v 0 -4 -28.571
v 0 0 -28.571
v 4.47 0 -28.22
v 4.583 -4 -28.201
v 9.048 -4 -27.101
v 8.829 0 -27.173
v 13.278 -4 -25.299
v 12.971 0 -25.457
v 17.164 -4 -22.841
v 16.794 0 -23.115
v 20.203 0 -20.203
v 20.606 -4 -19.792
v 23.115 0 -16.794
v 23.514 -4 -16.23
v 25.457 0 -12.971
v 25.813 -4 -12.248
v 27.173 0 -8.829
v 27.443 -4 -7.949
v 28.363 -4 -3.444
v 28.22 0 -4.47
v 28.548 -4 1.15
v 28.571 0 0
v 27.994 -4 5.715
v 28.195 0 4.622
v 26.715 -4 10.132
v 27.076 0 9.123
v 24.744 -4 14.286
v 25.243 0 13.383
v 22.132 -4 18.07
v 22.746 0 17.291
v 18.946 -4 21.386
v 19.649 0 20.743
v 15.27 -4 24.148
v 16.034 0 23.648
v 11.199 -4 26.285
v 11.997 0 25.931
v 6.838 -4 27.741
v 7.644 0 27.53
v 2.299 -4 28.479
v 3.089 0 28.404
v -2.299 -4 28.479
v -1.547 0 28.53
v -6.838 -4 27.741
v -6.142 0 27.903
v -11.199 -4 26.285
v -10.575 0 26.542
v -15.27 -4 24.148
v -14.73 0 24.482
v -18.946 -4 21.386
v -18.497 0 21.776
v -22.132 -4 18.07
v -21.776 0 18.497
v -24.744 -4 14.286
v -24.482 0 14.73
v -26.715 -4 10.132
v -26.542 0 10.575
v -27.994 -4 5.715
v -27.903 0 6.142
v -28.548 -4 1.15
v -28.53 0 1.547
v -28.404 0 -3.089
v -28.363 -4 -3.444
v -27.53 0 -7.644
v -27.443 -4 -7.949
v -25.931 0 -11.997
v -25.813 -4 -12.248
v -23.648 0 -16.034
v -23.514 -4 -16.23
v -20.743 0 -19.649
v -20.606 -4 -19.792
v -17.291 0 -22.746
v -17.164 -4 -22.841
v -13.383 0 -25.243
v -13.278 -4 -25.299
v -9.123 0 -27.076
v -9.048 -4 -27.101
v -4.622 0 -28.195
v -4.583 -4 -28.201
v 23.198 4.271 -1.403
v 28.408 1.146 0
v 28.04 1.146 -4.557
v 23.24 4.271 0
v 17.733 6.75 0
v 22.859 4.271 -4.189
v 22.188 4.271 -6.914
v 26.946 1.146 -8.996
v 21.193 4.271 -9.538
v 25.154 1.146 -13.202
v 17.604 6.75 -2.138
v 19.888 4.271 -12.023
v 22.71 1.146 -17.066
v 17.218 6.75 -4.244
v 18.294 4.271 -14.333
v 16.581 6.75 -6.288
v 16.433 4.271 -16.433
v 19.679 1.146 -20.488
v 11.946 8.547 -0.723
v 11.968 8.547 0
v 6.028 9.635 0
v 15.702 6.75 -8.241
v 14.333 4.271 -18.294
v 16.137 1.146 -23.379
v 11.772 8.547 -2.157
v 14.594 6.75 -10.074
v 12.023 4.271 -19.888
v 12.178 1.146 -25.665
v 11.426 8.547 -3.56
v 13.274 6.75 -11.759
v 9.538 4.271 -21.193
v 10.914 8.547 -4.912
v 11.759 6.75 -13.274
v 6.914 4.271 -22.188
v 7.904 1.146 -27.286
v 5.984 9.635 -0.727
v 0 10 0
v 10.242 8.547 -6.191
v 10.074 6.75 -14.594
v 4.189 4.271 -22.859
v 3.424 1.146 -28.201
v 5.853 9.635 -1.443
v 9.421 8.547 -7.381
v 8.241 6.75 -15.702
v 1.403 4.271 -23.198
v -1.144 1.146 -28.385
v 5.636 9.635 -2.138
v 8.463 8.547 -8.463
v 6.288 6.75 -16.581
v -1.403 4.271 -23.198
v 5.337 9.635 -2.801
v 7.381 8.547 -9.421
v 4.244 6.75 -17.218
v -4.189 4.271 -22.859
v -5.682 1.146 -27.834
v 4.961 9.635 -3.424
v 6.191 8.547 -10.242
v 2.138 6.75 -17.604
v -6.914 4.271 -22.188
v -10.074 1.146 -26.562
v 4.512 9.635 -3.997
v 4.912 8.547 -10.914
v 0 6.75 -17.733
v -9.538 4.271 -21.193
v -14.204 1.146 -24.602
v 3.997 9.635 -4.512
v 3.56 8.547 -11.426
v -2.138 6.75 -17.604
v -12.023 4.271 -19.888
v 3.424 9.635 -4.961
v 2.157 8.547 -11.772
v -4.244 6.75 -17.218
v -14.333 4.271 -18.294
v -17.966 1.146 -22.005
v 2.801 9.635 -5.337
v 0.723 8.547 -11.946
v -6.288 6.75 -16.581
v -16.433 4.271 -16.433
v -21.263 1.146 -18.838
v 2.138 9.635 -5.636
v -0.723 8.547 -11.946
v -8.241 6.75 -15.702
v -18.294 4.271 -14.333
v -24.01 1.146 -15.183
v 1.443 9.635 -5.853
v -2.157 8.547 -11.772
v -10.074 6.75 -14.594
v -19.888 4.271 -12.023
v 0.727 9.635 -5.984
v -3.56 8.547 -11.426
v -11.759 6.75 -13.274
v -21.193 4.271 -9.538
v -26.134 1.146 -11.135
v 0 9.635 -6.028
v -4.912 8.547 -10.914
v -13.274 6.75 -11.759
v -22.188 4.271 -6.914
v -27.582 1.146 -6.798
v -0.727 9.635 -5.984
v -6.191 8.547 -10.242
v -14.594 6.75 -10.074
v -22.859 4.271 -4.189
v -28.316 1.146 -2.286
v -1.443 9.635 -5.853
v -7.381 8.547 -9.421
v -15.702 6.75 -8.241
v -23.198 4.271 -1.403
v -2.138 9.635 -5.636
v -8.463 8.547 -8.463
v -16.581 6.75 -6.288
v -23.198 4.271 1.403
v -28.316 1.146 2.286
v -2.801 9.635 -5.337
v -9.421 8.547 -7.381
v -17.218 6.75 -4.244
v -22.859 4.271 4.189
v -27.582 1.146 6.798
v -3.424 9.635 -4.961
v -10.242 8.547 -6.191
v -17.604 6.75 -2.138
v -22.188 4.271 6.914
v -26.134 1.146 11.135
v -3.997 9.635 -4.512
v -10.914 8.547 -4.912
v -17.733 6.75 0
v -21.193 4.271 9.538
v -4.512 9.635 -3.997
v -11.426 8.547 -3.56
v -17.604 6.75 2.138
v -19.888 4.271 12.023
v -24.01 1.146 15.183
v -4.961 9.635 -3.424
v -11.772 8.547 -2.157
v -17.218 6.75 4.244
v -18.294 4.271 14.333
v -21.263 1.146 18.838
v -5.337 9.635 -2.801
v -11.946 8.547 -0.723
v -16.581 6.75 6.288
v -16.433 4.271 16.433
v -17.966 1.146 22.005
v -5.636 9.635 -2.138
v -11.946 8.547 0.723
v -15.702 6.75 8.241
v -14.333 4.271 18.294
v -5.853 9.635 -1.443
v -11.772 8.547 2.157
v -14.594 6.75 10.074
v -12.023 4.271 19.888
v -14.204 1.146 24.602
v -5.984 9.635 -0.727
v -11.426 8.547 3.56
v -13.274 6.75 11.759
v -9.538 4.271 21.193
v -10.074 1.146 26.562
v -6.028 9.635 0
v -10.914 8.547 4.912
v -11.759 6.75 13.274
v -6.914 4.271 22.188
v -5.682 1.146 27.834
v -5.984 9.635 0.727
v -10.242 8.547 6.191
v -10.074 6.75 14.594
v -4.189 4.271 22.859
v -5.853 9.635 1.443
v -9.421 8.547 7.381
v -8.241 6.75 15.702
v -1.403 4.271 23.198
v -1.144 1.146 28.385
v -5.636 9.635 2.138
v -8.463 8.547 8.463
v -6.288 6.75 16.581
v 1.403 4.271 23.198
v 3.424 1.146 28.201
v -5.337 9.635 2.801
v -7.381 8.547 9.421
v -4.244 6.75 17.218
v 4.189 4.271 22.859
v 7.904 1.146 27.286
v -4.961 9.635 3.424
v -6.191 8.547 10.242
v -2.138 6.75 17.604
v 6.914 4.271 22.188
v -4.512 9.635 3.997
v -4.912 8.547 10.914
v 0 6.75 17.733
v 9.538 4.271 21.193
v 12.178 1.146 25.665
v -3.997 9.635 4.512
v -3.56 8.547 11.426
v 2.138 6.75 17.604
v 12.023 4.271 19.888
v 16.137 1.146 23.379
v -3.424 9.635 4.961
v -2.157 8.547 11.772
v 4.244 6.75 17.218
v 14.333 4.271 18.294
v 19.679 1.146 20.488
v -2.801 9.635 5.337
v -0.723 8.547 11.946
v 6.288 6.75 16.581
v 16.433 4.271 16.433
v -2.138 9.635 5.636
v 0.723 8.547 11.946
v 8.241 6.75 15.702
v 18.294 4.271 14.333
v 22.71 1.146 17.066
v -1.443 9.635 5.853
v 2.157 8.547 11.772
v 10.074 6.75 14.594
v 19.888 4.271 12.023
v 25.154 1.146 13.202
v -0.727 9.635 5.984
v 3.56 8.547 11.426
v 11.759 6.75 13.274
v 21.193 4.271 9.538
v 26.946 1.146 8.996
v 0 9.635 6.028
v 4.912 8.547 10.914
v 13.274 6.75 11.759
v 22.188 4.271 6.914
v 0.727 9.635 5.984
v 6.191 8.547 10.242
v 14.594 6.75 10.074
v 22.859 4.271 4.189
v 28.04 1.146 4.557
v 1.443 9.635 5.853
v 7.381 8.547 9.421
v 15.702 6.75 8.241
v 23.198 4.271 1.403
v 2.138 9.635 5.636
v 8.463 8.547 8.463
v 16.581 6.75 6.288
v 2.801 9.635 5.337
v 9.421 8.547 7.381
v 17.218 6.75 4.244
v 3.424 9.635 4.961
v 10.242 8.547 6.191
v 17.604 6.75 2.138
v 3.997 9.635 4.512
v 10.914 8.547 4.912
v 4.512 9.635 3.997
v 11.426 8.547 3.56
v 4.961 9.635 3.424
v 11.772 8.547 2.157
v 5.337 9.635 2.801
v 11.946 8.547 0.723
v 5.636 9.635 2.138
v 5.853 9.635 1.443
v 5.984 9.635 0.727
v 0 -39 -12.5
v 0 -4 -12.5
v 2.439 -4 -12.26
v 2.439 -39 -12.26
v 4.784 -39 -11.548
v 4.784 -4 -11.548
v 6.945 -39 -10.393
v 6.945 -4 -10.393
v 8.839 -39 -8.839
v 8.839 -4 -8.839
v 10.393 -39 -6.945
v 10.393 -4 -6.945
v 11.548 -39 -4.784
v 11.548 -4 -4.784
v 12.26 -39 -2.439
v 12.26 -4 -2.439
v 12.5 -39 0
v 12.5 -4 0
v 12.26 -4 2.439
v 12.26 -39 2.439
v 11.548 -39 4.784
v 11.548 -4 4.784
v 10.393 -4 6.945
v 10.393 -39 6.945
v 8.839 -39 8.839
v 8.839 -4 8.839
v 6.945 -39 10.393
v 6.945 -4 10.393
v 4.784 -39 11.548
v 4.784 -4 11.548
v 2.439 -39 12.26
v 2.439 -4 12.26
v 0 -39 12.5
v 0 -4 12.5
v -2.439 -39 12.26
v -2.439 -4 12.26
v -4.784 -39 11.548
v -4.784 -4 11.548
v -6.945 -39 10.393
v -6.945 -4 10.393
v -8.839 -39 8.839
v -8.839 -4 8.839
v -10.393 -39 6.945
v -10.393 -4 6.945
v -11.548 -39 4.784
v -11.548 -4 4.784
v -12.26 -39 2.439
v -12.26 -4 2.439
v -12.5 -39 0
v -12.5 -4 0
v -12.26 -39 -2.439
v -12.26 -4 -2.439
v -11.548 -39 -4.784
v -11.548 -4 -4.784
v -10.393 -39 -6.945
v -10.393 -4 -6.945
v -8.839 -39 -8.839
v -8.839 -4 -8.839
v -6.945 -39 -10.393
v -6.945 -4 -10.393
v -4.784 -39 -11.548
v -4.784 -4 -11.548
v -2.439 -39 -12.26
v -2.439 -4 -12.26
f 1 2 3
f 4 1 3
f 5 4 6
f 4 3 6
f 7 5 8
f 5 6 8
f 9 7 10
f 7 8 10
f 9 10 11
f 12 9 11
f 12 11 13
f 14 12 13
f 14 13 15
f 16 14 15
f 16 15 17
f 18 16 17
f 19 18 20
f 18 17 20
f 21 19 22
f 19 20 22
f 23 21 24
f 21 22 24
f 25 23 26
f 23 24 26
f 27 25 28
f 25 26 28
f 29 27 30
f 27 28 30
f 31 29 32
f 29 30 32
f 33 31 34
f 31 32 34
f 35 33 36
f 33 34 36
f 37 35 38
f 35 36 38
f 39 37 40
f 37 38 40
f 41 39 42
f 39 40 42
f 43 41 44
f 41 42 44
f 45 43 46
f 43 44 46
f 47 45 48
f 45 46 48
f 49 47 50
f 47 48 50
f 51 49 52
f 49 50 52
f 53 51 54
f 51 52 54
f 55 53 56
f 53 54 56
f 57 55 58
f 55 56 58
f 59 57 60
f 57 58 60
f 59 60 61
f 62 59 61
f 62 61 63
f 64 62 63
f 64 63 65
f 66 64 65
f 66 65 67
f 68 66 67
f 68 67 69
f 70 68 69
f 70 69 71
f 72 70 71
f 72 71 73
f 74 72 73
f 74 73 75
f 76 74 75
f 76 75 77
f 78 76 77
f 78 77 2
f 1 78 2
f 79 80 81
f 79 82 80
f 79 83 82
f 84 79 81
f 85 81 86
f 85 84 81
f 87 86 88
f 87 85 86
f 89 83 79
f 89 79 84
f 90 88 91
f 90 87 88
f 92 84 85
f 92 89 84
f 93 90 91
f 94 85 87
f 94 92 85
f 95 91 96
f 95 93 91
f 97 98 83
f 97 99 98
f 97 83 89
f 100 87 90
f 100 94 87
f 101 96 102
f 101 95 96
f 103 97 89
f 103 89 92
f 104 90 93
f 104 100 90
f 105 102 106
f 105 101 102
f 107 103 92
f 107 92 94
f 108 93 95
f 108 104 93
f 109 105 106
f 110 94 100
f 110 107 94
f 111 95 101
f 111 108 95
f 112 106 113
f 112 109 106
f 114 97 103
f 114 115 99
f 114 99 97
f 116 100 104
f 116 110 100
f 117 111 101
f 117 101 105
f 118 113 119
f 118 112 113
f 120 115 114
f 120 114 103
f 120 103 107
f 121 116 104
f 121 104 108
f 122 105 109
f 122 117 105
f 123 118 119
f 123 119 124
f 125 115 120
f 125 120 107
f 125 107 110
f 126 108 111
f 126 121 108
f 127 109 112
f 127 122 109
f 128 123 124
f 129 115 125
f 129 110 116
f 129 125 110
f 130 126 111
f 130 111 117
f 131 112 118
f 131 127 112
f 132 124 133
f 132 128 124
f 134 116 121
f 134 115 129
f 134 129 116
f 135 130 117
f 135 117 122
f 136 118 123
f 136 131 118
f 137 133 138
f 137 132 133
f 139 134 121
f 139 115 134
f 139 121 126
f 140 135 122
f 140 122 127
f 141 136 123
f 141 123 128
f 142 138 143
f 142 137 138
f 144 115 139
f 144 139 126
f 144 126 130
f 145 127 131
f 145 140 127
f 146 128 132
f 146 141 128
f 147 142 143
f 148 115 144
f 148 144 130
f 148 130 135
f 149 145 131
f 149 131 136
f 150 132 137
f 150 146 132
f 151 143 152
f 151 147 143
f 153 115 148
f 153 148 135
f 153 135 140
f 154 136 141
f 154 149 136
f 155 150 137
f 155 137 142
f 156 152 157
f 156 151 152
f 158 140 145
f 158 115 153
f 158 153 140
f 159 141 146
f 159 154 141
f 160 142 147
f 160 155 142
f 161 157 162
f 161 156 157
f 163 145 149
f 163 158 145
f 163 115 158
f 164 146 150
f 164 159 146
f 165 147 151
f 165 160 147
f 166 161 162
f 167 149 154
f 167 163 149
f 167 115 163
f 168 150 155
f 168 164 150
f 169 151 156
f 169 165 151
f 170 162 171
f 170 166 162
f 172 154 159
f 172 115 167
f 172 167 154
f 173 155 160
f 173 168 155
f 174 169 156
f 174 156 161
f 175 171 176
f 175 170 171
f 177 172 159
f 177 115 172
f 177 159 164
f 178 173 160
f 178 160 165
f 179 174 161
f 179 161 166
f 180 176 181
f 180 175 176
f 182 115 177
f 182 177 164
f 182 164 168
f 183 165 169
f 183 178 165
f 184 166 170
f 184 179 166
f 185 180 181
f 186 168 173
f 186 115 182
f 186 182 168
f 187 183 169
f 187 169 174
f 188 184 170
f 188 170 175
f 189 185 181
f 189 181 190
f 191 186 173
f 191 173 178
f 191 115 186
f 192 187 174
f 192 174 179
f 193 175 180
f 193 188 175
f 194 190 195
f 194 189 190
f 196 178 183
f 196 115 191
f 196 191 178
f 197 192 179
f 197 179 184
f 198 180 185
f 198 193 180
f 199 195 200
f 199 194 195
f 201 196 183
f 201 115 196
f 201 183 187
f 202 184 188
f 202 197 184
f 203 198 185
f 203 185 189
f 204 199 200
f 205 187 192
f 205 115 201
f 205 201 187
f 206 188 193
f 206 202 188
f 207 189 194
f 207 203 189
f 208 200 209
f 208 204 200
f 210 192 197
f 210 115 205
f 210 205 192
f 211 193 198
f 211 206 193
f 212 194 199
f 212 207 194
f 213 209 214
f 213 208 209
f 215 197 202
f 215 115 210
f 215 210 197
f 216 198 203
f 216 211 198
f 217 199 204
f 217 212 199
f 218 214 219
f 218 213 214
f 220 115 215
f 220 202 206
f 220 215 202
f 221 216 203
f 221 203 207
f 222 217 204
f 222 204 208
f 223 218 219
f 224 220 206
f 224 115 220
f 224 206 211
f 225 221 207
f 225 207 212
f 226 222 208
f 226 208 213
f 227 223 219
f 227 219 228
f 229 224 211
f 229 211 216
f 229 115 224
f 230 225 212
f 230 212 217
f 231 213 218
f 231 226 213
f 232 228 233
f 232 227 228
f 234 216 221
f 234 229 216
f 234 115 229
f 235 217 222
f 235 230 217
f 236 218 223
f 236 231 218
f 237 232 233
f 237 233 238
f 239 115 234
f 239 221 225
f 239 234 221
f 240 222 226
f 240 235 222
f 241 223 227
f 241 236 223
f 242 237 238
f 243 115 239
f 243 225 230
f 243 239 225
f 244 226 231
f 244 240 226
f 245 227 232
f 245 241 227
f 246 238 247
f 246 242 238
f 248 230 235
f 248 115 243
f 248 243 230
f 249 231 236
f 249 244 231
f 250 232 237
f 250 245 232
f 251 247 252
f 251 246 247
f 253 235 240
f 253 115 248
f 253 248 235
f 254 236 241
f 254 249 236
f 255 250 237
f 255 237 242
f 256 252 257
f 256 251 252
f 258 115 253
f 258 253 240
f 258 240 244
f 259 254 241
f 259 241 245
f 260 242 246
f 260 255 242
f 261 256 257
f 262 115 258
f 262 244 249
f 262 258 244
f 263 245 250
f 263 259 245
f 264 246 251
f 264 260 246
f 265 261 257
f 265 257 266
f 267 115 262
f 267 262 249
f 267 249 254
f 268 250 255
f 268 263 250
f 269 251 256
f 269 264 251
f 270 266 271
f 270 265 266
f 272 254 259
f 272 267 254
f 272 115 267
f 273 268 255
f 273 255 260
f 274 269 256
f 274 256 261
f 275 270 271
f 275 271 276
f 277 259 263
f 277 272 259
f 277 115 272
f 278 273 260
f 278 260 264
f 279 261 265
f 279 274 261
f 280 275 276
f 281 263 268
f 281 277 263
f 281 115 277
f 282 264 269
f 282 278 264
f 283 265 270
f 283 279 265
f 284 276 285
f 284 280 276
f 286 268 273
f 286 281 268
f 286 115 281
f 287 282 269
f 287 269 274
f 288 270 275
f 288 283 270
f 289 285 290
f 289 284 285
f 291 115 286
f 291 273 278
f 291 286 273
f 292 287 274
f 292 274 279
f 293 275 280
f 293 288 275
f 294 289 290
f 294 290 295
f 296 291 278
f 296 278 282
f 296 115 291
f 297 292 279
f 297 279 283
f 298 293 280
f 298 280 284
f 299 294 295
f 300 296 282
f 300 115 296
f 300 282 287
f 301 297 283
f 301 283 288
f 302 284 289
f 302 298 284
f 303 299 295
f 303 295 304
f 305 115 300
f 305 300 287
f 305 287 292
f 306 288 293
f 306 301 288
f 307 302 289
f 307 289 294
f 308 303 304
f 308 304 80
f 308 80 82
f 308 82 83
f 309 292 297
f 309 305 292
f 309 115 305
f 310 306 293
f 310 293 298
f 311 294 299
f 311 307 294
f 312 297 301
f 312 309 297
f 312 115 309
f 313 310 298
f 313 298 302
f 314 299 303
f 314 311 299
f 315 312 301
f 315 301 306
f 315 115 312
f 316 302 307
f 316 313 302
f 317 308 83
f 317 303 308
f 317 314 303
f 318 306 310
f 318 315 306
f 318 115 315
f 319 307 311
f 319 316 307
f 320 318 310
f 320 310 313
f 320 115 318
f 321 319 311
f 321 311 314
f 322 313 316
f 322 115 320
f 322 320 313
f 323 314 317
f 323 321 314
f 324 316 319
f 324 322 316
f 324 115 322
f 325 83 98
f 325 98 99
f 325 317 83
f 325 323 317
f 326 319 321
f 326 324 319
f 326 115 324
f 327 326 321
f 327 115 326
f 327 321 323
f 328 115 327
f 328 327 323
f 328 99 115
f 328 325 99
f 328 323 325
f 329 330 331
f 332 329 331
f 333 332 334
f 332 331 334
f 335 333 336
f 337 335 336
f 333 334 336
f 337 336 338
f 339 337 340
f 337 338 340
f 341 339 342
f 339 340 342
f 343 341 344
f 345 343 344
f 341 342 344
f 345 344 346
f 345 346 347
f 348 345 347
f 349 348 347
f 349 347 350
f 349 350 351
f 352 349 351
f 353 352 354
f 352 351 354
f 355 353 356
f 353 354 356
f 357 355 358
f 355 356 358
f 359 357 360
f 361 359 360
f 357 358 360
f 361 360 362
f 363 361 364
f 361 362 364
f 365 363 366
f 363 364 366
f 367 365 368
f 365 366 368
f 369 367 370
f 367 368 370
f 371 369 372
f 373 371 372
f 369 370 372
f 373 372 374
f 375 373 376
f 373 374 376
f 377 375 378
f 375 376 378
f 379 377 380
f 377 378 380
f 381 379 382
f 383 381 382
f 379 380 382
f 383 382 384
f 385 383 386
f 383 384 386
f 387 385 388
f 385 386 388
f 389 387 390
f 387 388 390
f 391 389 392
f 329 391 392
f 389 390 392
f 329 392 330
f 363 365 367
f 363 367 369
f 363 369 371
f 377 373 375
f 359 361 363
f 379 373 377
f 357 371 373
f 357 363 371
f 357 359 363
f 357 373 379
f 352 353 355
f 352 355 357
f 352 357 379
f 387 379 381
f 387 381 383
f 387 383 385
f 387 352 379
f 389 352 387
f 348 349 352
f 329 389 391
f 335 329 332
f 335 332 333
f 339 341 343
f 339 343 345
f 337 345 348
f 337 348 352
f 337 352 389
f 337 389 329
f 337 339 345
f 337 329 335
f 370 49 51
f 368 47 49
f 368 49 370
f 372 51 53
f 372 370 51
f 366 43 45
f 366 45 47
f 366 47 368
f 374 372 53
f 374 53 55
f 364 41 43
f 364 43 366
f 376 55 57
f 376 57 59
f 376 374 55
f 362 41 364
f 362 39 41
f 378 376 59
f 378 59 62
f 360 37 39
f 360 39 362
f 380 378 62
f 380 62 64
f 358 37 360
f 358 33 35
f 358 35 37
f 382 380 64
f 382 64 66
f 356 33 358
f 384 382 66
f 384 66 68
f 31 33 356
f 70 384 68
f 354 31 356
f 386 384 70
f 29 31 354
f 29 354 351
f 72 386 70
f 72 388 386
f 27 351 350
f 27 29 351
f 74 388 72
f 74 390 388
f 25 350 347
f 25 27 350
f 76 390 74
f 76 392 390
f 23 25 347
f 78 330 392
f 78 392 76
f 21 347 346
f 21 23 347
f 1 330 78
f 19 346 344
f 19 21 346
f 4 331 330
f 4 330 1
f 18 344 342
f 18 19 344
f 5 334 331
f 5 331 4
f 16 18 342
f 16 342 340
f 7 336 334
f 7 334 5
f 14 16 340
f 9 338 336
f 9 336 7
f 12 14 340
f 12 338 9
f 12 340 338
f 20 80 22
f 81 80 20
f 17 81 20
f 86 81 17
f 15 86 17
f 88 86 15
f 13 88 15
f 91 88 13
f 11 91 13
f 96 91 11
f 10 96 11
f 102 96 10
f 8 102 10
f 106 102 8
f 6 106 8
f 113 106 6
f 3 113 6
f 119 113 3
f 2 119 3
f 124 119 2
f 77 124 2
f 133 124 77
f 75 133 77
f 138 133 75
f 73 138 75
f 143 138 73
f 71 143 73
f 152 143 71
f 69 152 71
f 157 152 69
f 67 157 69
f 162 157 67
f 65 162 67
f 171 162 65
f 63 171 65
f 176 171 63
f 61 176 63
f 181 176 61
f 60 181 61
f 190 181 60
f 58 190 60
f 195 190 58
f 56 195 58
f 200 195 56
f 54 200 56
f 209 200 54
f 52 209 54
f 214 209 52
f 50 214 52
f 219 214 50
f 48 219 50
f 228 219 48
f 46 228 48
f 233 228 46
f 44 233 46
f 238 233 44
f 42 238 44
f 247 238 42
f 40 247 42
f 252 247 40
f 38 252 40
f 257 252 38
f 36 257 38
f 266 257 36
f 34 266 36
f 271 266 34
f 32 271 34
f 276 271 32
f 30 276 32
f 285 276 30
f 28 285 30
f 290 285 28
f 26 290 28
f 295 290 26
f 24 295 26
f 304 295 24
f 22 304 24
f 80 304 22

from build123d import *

# Parameters (mm, degrees)
CHAMFER1_SIZE       = 1.428571429
SKETCH7_R           = 28.571428571
BOSS_EXTRUDE2_DEPTH = 4
SKETCH8_R           = 12.5
BOSS_EXTRUDE3_DEPTH = 35


with BuildPart() as part:
    # Sketch1 → Revolve1 (revolve)
    with BuildSketch(Plane.XY, mode=Mode.PRIVATE) as revolve1_sk:
        with BuildLine():
            Line((0, 0), (-30, 0))
            ThreePointArc((-30, 0), (-15.811388301, 7.434164903), (0, 10))
            Line((0, 10), (0, 0))
        make_face()
    revolve(revolve1_sk.sketch.rotate(Axis((0, 0, 0), (0, 1, 0)), 180), axis=Axis((0, 0, 0), (0, 1, 0)))

    # Chamfer1
    # the kernel refuses this chamfer: 2, 1.428571429 mm, written as the material it takes off along each edge
    with BuildSketch(Plane(origin=(0, 0, 0), x_dir=(1, 0, 0), z_dir=(0, 0, 1))) as chamfer1_piece_1:
        with BuildLine():
            Line((30 - CHAMFER1_SIZE, 0), (28.407698006, 1.14611396))
            ThreePointArc((28.407698006, 1.14611396), (29.186973853, 0.597051091), (30, 0))
            Line((30, 0), (30 - CHAMFER1_SIZE, 0))
        make_face()
    revolve(axis=Axis((0, 0, 0), (0, 1, 0)), mode=Mode.SUBTRACT)

    # Sketch7 → Boss-Extrude2 (add)
    with BuildSketch(Plane.XZ):
        with Locations(Location((0, 0, 0), (0, 0, 270))):
            Circle(SKETCH7_R)
    extrude(amount=BOSS_EXTRUDE2_DEPTH)

    # Sketch8 → Boss-Extrude3 (add)
    with BuildSketch(Plane.XZ.offset(4)):
        with Locations(Location((0, 0, 0), (0, 0, 270))):
            Circle(SKETCH8_R)
    extrude(amount=BOSS_EXTRUDE3_DEPTH)


solid = part.part
